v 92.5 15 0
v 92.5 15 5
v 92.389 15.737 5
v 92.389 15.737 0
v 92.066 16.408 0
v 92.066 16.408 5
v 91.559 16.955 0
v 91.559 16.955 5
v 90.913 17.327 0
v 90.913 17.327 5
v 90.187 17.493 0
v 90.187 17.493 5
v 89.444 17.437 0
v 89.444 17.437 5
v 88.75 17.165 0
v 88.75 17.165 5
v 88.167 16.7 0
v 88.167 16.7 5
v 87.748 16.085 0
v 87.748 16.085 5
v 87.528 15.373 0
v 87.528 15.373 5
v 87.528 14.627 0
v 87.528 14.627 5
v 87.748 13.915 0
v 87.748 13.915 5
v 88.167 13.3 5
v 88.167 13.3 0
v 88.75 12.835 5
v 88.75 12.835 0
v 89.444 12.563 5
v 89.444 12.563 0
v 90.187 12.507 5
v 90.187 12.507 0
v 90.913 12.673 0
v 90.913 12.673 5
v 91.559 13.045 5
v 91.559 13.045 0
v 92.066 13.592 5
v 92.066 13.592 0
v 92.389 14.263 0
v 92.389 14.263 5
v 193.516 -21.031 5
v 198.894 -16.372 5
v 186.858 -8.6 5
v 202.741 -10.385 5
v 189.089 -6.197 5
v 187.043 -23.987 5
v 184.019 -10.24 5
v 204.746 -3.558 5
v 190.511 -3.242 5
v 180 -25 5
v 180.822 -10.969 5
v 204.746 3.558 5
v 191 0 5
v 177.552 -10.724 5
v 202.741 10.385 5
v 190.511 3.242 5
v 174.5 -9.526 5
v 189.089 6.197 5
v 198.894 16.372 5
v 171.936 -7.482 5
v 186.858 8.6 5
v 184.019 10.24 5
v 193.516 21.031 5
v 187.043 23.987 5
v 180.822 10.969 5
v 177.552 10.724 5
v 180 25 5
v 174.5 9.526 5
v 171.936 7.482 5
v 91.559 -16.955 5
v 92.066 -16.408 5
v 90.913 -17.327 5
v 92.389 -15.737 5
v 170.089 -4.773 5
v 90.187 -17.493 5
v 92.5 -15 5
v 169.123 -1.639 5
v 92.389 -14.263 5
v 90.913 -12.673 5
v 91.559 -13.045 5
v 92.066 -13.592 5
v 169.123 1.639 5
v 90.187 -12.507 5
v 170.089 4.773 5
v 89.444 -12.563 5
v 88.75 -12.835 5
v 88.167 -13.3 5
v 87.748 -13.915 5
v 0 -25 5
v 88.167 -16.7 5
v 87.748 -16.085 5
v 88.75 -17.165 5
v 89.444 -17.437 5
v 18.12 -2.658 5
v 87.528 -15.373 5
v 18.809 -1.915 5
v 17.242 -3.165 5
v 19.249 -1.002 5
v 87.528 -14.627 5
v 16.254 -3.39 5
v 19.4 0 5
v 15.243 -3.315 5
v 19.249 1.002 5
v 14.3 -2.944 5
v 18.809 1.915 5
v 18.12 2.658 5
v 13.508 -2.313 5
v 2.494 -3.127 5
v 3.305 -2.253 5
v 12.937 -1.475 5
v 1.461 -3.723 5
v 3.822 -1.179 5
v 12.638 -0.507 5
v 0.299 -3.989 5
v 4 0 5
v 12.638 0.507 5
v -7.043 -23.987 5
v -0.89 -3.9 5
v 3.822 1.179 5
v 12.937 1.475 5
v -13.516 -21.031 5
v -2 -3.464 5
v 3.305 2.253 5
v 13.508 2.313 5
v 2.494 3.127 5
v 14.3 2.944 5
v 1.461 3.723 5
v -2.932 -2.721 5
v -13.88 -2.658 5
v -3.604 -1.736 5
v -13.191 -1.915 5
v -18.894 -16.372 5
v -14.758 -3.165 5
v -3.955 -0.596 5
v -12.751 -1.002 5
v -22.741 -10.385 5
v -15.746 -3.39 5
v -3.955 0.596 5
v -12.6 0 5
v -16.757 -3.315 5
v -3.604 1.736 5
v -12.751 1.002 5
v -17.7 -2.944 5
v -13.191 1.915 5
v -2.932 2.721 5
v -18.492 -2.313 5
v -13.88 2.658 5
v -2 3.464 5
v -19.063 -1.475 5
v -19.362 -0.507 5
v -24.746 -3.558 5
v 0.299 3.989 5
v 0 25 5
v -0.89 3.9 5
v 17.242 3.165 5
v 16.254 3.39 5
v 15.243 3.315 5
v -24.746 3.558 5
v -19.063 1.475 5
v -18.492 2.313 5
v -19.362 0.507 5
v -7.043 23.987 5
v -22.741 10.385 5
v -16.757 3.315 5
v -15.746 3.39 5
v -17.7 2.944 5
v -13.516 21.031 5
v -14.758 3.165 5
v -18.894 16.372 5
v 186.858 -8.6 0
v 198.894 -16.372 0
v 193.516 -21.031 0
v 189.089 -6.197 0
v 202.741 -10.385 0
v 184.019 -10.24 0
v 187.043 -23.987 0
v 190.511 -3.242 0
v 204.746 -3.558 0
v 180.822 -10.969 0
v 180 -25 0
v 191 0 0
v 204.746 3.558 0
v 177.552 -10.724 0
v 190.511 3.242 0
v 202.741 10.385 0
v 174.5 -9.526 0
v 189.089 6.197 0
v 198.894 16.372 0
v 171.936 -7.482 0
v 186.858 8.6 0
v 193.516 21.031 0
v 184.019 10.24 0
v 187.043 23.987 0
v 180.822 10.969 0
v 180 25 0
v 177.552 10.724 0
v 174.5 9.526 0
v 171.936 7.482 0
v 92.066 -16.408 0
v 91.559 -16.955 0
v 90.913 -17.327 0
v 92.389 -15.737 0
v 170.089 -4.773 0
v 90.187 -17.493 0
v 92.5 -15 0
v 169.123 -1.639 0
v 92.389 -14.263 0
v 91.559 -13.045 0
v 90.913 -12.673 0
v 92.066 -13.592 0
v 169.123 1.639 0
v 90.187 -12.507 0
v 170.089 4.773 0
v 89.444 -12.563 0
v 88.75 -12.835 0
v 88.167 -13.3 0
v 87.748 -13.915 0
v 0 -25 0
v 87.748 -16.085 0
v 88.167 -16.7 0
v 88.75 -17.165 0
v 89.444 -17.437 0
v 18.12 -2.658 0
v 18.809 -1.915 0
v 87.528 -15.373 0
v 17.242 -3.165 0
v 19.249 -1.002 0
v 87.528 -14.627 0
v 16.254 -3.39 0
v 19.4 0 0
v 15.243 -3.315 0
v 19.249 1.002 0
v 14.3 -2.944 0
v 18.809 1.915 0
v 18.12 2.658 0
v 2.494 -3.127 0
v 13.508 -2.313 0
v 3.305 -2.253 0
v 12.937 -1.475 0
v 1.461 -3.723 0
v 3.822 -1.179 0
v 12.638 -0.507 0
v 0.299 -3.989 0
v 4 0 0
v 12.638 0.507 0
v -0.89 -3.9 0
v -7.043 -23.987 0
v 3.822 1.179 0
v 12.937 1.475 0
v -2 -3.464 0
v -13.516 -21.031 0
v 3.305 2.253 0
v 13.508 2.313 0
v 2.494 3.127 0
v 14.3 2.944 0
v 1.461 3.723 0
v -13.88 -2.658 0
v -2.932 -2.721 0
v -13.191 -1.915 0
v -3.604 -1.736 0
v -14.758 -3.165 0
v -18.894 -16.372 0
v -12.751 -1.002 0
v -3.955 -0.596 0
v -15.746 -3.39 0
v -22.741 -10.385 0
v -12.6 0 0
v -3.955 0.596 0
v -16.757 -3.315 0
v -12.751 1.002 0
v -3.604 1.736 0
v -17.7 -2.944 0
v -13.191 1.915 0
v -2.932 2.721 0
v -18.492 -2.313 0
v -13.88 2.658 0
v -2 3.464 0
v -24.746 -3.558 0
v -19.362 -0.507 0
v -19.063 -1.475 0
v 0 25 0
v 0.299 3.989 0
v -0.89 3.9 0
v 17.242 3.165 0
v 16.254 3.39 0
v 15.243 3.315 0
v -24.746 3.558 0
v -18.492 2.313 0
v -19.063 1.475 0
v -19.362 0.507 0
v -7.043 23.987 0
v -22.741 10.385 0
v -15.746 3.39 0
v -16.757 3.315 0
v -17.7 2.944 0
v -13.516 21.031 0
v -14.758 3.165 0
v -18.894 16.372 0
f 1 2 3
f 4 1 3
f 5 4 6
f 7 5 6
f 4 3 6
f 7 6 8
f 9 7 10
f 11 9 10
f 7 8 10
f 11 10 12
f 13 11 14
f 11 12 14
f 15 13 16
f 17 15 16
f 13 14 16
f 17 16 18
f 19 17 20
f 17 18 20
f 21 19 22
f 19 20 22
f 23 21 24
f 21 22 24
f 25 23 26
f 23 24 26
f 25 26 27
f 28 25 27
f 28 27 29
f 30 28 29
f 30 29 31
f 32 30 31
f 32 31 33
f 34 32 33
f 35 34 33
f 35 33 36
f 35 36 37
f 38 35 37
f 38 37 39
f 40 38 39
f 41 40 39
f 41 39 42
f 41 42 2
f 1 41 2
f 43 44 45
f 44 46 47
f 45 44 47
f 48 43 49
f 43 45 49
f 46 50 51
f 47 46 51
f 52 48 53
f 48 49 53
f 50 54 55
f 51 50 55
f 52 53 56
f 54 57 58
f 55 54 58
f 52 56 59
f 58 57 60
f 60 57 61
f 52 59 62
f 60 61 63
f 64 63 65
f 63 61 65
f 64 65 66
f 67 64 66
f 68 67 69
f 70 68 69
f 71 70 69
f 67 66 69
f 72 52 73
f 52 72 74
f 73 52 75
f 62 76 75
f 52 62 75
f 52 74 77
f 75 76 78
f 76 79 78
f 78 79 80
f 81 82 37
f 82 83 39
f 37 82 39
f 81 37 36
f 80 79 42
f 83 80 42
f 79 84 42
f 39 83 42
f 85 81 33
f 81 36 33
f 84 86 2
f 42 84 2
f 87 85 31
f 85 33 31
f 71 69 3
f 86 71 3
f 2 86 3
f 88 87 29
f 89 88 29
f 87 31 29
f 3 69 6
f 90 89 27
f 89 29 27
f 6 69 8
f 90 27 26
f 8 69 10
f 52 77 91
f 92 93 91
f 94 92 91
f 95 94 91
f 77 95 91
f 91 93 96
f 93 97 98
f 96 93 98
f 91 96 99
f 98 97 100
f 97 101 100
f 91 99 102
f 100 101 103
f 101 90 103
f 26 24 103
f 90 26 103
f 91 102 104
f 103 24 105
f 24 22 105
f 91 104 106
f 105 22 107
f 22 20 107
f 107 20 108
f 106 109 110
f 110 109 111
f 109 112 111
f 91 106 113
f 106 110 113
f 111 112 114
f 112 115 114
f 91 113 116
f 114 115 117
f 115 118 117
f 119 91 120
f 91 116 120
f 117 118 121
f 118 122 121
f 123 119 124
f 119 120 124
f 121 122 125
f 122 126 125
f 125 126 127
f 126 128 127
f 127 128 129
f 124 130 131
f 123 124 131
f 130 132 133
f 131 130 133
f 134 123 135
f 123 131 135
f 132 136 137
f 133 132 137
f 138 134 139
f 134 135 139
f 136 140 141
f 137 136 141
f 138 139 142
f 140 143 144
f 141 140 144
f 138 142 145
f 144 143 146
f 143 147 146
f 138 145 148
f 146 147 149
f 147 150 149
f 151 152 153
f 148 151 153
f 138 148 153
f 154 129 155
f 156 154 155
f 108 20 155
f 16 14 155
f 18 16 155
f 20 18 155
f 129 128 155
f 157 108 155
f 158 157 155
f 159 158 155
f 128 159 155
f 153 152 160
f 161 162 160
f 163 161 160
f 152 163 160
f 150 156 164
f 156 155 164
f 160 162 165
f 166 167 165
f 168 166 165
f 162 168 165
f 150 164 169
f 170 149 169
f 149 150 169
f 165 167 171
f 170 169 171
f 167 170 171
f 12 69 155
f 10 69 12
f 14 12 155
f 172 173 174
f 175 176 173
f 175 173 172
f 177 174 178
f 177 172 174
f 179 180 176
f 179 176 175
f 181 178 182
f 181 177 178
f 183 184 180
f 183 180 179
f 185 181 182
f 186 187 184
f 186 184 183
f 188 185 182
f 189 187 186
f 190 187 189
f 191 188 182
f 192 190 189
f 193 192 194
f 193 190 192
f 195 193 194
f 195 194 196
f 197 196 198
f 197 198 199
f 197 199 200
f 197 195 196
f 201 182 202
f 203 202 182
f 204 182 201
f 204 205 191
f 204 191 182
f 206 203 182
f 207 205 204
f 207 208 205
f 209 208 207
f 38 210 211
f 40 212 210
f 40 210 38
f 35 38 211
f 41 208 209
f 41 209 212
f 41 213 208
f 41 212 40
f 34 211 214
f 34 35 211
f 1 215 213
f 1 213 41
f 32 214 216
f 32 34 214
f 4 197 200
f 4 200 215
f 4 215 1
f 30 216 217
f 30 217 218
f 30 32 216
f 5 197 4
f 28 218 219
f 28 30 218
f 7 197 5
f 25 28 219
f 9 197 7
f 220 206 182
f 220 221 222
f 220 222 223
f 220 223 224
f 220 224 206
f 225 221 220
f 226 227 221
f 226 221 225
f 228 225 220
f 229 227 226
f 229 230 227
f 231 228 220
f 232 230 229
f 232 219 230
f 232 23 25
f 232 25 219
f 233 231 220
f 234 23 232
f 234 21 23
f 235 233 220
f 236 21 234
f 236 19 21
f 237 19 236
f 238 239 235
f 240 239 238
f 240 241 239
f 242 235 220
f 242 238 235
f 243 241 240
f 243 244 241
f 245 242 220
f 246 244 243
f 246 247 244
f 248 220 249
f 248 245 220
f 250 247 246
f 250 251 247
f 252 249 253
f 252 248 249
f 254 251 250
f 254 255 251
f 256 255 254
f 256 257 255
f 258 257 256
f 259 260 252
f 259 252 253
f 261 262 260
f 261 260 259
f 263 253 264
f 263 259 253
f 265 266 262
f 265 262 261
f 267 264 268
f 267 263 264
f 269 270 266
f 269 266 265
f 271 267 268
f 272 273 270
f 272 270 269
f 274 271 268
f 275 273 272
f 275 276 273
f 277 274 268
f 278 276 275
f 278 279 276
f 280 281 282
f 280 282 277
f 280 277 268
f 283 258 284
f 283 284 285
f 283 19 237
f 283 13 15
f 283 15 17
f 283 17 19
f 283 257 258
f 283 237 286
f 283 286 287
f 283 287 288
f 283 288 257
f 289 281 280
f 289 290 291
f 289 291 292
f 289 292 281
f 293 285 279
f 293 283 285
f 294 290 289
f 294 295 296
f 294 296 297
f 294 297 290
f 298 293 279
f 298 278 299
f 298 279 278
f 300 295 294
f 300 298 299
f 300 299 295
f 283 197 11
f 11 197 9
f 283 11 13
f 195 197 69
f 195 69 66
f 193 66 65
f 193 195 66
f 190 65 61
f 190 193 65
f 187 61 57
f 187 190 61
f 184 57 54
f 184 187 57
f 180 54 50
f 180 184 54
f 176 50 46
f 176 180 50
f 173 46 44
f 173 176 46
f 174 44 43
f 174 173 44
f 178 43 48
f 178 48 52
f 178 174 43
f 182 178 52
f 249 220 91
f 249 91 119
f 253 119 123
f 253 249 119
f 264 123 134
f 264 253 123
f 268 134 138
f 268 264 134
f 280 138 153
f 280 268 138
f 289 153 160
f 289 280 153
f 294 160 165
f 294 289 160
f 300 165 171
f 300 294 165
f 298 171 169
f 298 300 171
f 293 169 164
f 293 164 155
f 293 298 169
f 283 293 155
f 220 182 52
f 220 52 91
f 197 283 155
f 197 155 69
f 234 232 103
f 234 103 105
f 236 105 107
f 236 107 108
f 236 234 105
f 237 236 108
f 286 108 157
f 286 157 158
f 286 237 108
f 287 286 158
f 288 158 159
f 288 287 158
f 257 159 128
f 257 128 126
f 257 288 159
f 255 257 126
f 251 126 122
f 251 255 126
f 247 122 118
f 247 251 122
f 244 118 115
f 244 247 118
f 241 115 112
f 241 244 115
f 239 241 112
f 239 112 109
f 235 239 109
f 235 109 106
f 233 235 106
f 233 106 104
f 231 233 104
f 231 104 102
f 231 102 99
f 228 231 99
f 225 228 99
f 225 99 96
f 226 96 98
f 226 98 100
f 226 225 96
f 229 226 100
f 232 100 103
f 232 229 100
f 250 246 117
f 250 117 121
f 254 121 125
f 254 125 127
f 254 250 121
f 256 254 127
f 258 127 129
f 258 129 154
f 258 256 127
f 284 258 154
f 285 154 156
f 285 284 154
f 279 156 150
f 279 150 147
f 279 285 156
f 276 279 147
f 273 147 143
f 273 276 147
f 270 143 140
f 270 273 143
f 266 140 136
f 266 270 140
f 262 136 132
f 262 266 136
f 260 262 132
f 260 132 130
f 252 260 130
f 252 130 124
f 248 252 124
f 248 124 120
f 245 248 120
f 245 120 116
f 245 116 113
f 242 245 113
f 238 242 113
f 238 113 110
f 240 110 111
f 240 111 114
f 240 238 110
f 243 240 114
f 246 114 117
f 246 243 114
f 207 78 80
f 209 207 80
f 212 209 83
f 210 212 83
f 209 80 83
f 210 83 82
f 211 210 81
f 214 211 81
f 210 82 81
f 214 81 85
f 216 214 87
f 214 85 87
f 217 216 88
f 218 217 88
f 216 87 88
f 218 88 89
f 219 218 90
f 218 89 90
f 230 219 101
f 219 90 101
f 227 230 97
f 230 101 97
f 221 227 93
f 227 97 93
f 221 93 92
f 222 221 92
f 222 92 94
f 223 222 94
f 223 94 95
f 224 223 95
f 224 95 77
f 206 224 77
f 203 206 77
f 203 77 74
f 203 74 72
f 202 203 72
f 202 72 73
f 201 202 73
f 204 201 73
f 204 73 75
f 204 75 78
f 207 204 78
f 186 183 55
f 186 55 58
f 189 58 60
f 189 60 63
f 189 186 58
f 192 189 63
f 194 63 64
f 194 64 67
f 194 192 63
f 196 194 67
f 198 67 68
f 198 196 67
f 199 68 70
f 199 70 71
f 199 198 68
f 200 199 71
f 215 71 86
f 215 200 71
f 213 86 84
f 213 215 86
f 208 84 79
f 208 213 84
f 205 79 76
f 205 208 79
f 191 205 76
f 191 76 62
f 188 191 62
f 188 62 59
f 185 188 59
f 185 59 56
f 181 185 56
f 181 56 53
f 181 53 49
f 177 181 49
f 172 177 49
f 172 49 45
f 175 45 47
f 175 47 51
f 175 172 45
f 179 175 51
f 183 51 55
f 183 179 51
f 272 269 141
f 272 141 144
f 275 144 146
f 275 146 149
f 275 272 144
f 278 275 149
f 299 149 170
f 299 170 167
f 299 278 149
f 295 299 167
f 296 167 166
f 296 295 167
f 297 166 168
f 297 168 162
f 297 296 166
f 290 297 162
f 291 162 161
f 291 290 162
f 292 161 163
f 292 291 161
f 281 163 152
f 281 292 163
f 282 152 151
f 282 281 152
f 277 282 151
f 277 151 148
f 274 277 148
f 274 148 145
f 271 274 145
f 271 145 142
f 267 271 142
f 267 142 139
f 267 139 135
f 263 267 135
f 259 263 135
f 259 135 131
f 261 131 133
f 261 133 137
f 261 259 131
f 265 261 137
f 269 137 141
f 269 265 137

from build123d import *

# Parameters (mm, degrees)
SKETCH1_R           = 4
SKETCH1_R_2         = 3.4
SKETCH1_R_3         = 11
BOSS_EXTRUDE3_DEPTH = 5
SKETCH2_R           = 2.5
CUT_EXTRUDE1_DEPTH  = 10


with BuildPart() as part:
    # Sketch1 → Boss-Extrude3 (new body)
    with BuildSketch(Plane.XY):
        with BuildLine():
            Line((0, 25), (180, 25))
            ThreePointArc((180, 25), (205, 0), (180, -25))
            Line((180, -25), (0, -25))
            ThreePointArc((0, -25), (-25, 0), (0, 25))
        make_face()
        Circle(SKETCH1_R, mode=Mode.SUBTRACT)
        with Locations((-16, 0)):
            Circle(SKETCH1_R_2, mode=Mode.SUBTRACT)
        with Locations((16, 0)):
            Circle(SKETCH1_R_2, mode=Mode.SUBTRACT)
        with Locations((180, 0)):
            Circle(SKETCH1_R_3, mode=Mode.SUBTRACT)
    extrude(amount=BOSS_EXTRUDE3_DEPTH)

    # Sketch2 → Cut-Extrude1 (cut)
    with BuildSketch(Plane.XY.offset(5)):
        with Locations((90, 15)):
            Circle(SKETCH2_R)
        with Locations((90, -15)):
            Circle(SKETCH2_R)
    extrude(amount=-CUT_EXTRUDE1_DEPTH, mode=Mode.SUBTRACT)


solid = part.part
